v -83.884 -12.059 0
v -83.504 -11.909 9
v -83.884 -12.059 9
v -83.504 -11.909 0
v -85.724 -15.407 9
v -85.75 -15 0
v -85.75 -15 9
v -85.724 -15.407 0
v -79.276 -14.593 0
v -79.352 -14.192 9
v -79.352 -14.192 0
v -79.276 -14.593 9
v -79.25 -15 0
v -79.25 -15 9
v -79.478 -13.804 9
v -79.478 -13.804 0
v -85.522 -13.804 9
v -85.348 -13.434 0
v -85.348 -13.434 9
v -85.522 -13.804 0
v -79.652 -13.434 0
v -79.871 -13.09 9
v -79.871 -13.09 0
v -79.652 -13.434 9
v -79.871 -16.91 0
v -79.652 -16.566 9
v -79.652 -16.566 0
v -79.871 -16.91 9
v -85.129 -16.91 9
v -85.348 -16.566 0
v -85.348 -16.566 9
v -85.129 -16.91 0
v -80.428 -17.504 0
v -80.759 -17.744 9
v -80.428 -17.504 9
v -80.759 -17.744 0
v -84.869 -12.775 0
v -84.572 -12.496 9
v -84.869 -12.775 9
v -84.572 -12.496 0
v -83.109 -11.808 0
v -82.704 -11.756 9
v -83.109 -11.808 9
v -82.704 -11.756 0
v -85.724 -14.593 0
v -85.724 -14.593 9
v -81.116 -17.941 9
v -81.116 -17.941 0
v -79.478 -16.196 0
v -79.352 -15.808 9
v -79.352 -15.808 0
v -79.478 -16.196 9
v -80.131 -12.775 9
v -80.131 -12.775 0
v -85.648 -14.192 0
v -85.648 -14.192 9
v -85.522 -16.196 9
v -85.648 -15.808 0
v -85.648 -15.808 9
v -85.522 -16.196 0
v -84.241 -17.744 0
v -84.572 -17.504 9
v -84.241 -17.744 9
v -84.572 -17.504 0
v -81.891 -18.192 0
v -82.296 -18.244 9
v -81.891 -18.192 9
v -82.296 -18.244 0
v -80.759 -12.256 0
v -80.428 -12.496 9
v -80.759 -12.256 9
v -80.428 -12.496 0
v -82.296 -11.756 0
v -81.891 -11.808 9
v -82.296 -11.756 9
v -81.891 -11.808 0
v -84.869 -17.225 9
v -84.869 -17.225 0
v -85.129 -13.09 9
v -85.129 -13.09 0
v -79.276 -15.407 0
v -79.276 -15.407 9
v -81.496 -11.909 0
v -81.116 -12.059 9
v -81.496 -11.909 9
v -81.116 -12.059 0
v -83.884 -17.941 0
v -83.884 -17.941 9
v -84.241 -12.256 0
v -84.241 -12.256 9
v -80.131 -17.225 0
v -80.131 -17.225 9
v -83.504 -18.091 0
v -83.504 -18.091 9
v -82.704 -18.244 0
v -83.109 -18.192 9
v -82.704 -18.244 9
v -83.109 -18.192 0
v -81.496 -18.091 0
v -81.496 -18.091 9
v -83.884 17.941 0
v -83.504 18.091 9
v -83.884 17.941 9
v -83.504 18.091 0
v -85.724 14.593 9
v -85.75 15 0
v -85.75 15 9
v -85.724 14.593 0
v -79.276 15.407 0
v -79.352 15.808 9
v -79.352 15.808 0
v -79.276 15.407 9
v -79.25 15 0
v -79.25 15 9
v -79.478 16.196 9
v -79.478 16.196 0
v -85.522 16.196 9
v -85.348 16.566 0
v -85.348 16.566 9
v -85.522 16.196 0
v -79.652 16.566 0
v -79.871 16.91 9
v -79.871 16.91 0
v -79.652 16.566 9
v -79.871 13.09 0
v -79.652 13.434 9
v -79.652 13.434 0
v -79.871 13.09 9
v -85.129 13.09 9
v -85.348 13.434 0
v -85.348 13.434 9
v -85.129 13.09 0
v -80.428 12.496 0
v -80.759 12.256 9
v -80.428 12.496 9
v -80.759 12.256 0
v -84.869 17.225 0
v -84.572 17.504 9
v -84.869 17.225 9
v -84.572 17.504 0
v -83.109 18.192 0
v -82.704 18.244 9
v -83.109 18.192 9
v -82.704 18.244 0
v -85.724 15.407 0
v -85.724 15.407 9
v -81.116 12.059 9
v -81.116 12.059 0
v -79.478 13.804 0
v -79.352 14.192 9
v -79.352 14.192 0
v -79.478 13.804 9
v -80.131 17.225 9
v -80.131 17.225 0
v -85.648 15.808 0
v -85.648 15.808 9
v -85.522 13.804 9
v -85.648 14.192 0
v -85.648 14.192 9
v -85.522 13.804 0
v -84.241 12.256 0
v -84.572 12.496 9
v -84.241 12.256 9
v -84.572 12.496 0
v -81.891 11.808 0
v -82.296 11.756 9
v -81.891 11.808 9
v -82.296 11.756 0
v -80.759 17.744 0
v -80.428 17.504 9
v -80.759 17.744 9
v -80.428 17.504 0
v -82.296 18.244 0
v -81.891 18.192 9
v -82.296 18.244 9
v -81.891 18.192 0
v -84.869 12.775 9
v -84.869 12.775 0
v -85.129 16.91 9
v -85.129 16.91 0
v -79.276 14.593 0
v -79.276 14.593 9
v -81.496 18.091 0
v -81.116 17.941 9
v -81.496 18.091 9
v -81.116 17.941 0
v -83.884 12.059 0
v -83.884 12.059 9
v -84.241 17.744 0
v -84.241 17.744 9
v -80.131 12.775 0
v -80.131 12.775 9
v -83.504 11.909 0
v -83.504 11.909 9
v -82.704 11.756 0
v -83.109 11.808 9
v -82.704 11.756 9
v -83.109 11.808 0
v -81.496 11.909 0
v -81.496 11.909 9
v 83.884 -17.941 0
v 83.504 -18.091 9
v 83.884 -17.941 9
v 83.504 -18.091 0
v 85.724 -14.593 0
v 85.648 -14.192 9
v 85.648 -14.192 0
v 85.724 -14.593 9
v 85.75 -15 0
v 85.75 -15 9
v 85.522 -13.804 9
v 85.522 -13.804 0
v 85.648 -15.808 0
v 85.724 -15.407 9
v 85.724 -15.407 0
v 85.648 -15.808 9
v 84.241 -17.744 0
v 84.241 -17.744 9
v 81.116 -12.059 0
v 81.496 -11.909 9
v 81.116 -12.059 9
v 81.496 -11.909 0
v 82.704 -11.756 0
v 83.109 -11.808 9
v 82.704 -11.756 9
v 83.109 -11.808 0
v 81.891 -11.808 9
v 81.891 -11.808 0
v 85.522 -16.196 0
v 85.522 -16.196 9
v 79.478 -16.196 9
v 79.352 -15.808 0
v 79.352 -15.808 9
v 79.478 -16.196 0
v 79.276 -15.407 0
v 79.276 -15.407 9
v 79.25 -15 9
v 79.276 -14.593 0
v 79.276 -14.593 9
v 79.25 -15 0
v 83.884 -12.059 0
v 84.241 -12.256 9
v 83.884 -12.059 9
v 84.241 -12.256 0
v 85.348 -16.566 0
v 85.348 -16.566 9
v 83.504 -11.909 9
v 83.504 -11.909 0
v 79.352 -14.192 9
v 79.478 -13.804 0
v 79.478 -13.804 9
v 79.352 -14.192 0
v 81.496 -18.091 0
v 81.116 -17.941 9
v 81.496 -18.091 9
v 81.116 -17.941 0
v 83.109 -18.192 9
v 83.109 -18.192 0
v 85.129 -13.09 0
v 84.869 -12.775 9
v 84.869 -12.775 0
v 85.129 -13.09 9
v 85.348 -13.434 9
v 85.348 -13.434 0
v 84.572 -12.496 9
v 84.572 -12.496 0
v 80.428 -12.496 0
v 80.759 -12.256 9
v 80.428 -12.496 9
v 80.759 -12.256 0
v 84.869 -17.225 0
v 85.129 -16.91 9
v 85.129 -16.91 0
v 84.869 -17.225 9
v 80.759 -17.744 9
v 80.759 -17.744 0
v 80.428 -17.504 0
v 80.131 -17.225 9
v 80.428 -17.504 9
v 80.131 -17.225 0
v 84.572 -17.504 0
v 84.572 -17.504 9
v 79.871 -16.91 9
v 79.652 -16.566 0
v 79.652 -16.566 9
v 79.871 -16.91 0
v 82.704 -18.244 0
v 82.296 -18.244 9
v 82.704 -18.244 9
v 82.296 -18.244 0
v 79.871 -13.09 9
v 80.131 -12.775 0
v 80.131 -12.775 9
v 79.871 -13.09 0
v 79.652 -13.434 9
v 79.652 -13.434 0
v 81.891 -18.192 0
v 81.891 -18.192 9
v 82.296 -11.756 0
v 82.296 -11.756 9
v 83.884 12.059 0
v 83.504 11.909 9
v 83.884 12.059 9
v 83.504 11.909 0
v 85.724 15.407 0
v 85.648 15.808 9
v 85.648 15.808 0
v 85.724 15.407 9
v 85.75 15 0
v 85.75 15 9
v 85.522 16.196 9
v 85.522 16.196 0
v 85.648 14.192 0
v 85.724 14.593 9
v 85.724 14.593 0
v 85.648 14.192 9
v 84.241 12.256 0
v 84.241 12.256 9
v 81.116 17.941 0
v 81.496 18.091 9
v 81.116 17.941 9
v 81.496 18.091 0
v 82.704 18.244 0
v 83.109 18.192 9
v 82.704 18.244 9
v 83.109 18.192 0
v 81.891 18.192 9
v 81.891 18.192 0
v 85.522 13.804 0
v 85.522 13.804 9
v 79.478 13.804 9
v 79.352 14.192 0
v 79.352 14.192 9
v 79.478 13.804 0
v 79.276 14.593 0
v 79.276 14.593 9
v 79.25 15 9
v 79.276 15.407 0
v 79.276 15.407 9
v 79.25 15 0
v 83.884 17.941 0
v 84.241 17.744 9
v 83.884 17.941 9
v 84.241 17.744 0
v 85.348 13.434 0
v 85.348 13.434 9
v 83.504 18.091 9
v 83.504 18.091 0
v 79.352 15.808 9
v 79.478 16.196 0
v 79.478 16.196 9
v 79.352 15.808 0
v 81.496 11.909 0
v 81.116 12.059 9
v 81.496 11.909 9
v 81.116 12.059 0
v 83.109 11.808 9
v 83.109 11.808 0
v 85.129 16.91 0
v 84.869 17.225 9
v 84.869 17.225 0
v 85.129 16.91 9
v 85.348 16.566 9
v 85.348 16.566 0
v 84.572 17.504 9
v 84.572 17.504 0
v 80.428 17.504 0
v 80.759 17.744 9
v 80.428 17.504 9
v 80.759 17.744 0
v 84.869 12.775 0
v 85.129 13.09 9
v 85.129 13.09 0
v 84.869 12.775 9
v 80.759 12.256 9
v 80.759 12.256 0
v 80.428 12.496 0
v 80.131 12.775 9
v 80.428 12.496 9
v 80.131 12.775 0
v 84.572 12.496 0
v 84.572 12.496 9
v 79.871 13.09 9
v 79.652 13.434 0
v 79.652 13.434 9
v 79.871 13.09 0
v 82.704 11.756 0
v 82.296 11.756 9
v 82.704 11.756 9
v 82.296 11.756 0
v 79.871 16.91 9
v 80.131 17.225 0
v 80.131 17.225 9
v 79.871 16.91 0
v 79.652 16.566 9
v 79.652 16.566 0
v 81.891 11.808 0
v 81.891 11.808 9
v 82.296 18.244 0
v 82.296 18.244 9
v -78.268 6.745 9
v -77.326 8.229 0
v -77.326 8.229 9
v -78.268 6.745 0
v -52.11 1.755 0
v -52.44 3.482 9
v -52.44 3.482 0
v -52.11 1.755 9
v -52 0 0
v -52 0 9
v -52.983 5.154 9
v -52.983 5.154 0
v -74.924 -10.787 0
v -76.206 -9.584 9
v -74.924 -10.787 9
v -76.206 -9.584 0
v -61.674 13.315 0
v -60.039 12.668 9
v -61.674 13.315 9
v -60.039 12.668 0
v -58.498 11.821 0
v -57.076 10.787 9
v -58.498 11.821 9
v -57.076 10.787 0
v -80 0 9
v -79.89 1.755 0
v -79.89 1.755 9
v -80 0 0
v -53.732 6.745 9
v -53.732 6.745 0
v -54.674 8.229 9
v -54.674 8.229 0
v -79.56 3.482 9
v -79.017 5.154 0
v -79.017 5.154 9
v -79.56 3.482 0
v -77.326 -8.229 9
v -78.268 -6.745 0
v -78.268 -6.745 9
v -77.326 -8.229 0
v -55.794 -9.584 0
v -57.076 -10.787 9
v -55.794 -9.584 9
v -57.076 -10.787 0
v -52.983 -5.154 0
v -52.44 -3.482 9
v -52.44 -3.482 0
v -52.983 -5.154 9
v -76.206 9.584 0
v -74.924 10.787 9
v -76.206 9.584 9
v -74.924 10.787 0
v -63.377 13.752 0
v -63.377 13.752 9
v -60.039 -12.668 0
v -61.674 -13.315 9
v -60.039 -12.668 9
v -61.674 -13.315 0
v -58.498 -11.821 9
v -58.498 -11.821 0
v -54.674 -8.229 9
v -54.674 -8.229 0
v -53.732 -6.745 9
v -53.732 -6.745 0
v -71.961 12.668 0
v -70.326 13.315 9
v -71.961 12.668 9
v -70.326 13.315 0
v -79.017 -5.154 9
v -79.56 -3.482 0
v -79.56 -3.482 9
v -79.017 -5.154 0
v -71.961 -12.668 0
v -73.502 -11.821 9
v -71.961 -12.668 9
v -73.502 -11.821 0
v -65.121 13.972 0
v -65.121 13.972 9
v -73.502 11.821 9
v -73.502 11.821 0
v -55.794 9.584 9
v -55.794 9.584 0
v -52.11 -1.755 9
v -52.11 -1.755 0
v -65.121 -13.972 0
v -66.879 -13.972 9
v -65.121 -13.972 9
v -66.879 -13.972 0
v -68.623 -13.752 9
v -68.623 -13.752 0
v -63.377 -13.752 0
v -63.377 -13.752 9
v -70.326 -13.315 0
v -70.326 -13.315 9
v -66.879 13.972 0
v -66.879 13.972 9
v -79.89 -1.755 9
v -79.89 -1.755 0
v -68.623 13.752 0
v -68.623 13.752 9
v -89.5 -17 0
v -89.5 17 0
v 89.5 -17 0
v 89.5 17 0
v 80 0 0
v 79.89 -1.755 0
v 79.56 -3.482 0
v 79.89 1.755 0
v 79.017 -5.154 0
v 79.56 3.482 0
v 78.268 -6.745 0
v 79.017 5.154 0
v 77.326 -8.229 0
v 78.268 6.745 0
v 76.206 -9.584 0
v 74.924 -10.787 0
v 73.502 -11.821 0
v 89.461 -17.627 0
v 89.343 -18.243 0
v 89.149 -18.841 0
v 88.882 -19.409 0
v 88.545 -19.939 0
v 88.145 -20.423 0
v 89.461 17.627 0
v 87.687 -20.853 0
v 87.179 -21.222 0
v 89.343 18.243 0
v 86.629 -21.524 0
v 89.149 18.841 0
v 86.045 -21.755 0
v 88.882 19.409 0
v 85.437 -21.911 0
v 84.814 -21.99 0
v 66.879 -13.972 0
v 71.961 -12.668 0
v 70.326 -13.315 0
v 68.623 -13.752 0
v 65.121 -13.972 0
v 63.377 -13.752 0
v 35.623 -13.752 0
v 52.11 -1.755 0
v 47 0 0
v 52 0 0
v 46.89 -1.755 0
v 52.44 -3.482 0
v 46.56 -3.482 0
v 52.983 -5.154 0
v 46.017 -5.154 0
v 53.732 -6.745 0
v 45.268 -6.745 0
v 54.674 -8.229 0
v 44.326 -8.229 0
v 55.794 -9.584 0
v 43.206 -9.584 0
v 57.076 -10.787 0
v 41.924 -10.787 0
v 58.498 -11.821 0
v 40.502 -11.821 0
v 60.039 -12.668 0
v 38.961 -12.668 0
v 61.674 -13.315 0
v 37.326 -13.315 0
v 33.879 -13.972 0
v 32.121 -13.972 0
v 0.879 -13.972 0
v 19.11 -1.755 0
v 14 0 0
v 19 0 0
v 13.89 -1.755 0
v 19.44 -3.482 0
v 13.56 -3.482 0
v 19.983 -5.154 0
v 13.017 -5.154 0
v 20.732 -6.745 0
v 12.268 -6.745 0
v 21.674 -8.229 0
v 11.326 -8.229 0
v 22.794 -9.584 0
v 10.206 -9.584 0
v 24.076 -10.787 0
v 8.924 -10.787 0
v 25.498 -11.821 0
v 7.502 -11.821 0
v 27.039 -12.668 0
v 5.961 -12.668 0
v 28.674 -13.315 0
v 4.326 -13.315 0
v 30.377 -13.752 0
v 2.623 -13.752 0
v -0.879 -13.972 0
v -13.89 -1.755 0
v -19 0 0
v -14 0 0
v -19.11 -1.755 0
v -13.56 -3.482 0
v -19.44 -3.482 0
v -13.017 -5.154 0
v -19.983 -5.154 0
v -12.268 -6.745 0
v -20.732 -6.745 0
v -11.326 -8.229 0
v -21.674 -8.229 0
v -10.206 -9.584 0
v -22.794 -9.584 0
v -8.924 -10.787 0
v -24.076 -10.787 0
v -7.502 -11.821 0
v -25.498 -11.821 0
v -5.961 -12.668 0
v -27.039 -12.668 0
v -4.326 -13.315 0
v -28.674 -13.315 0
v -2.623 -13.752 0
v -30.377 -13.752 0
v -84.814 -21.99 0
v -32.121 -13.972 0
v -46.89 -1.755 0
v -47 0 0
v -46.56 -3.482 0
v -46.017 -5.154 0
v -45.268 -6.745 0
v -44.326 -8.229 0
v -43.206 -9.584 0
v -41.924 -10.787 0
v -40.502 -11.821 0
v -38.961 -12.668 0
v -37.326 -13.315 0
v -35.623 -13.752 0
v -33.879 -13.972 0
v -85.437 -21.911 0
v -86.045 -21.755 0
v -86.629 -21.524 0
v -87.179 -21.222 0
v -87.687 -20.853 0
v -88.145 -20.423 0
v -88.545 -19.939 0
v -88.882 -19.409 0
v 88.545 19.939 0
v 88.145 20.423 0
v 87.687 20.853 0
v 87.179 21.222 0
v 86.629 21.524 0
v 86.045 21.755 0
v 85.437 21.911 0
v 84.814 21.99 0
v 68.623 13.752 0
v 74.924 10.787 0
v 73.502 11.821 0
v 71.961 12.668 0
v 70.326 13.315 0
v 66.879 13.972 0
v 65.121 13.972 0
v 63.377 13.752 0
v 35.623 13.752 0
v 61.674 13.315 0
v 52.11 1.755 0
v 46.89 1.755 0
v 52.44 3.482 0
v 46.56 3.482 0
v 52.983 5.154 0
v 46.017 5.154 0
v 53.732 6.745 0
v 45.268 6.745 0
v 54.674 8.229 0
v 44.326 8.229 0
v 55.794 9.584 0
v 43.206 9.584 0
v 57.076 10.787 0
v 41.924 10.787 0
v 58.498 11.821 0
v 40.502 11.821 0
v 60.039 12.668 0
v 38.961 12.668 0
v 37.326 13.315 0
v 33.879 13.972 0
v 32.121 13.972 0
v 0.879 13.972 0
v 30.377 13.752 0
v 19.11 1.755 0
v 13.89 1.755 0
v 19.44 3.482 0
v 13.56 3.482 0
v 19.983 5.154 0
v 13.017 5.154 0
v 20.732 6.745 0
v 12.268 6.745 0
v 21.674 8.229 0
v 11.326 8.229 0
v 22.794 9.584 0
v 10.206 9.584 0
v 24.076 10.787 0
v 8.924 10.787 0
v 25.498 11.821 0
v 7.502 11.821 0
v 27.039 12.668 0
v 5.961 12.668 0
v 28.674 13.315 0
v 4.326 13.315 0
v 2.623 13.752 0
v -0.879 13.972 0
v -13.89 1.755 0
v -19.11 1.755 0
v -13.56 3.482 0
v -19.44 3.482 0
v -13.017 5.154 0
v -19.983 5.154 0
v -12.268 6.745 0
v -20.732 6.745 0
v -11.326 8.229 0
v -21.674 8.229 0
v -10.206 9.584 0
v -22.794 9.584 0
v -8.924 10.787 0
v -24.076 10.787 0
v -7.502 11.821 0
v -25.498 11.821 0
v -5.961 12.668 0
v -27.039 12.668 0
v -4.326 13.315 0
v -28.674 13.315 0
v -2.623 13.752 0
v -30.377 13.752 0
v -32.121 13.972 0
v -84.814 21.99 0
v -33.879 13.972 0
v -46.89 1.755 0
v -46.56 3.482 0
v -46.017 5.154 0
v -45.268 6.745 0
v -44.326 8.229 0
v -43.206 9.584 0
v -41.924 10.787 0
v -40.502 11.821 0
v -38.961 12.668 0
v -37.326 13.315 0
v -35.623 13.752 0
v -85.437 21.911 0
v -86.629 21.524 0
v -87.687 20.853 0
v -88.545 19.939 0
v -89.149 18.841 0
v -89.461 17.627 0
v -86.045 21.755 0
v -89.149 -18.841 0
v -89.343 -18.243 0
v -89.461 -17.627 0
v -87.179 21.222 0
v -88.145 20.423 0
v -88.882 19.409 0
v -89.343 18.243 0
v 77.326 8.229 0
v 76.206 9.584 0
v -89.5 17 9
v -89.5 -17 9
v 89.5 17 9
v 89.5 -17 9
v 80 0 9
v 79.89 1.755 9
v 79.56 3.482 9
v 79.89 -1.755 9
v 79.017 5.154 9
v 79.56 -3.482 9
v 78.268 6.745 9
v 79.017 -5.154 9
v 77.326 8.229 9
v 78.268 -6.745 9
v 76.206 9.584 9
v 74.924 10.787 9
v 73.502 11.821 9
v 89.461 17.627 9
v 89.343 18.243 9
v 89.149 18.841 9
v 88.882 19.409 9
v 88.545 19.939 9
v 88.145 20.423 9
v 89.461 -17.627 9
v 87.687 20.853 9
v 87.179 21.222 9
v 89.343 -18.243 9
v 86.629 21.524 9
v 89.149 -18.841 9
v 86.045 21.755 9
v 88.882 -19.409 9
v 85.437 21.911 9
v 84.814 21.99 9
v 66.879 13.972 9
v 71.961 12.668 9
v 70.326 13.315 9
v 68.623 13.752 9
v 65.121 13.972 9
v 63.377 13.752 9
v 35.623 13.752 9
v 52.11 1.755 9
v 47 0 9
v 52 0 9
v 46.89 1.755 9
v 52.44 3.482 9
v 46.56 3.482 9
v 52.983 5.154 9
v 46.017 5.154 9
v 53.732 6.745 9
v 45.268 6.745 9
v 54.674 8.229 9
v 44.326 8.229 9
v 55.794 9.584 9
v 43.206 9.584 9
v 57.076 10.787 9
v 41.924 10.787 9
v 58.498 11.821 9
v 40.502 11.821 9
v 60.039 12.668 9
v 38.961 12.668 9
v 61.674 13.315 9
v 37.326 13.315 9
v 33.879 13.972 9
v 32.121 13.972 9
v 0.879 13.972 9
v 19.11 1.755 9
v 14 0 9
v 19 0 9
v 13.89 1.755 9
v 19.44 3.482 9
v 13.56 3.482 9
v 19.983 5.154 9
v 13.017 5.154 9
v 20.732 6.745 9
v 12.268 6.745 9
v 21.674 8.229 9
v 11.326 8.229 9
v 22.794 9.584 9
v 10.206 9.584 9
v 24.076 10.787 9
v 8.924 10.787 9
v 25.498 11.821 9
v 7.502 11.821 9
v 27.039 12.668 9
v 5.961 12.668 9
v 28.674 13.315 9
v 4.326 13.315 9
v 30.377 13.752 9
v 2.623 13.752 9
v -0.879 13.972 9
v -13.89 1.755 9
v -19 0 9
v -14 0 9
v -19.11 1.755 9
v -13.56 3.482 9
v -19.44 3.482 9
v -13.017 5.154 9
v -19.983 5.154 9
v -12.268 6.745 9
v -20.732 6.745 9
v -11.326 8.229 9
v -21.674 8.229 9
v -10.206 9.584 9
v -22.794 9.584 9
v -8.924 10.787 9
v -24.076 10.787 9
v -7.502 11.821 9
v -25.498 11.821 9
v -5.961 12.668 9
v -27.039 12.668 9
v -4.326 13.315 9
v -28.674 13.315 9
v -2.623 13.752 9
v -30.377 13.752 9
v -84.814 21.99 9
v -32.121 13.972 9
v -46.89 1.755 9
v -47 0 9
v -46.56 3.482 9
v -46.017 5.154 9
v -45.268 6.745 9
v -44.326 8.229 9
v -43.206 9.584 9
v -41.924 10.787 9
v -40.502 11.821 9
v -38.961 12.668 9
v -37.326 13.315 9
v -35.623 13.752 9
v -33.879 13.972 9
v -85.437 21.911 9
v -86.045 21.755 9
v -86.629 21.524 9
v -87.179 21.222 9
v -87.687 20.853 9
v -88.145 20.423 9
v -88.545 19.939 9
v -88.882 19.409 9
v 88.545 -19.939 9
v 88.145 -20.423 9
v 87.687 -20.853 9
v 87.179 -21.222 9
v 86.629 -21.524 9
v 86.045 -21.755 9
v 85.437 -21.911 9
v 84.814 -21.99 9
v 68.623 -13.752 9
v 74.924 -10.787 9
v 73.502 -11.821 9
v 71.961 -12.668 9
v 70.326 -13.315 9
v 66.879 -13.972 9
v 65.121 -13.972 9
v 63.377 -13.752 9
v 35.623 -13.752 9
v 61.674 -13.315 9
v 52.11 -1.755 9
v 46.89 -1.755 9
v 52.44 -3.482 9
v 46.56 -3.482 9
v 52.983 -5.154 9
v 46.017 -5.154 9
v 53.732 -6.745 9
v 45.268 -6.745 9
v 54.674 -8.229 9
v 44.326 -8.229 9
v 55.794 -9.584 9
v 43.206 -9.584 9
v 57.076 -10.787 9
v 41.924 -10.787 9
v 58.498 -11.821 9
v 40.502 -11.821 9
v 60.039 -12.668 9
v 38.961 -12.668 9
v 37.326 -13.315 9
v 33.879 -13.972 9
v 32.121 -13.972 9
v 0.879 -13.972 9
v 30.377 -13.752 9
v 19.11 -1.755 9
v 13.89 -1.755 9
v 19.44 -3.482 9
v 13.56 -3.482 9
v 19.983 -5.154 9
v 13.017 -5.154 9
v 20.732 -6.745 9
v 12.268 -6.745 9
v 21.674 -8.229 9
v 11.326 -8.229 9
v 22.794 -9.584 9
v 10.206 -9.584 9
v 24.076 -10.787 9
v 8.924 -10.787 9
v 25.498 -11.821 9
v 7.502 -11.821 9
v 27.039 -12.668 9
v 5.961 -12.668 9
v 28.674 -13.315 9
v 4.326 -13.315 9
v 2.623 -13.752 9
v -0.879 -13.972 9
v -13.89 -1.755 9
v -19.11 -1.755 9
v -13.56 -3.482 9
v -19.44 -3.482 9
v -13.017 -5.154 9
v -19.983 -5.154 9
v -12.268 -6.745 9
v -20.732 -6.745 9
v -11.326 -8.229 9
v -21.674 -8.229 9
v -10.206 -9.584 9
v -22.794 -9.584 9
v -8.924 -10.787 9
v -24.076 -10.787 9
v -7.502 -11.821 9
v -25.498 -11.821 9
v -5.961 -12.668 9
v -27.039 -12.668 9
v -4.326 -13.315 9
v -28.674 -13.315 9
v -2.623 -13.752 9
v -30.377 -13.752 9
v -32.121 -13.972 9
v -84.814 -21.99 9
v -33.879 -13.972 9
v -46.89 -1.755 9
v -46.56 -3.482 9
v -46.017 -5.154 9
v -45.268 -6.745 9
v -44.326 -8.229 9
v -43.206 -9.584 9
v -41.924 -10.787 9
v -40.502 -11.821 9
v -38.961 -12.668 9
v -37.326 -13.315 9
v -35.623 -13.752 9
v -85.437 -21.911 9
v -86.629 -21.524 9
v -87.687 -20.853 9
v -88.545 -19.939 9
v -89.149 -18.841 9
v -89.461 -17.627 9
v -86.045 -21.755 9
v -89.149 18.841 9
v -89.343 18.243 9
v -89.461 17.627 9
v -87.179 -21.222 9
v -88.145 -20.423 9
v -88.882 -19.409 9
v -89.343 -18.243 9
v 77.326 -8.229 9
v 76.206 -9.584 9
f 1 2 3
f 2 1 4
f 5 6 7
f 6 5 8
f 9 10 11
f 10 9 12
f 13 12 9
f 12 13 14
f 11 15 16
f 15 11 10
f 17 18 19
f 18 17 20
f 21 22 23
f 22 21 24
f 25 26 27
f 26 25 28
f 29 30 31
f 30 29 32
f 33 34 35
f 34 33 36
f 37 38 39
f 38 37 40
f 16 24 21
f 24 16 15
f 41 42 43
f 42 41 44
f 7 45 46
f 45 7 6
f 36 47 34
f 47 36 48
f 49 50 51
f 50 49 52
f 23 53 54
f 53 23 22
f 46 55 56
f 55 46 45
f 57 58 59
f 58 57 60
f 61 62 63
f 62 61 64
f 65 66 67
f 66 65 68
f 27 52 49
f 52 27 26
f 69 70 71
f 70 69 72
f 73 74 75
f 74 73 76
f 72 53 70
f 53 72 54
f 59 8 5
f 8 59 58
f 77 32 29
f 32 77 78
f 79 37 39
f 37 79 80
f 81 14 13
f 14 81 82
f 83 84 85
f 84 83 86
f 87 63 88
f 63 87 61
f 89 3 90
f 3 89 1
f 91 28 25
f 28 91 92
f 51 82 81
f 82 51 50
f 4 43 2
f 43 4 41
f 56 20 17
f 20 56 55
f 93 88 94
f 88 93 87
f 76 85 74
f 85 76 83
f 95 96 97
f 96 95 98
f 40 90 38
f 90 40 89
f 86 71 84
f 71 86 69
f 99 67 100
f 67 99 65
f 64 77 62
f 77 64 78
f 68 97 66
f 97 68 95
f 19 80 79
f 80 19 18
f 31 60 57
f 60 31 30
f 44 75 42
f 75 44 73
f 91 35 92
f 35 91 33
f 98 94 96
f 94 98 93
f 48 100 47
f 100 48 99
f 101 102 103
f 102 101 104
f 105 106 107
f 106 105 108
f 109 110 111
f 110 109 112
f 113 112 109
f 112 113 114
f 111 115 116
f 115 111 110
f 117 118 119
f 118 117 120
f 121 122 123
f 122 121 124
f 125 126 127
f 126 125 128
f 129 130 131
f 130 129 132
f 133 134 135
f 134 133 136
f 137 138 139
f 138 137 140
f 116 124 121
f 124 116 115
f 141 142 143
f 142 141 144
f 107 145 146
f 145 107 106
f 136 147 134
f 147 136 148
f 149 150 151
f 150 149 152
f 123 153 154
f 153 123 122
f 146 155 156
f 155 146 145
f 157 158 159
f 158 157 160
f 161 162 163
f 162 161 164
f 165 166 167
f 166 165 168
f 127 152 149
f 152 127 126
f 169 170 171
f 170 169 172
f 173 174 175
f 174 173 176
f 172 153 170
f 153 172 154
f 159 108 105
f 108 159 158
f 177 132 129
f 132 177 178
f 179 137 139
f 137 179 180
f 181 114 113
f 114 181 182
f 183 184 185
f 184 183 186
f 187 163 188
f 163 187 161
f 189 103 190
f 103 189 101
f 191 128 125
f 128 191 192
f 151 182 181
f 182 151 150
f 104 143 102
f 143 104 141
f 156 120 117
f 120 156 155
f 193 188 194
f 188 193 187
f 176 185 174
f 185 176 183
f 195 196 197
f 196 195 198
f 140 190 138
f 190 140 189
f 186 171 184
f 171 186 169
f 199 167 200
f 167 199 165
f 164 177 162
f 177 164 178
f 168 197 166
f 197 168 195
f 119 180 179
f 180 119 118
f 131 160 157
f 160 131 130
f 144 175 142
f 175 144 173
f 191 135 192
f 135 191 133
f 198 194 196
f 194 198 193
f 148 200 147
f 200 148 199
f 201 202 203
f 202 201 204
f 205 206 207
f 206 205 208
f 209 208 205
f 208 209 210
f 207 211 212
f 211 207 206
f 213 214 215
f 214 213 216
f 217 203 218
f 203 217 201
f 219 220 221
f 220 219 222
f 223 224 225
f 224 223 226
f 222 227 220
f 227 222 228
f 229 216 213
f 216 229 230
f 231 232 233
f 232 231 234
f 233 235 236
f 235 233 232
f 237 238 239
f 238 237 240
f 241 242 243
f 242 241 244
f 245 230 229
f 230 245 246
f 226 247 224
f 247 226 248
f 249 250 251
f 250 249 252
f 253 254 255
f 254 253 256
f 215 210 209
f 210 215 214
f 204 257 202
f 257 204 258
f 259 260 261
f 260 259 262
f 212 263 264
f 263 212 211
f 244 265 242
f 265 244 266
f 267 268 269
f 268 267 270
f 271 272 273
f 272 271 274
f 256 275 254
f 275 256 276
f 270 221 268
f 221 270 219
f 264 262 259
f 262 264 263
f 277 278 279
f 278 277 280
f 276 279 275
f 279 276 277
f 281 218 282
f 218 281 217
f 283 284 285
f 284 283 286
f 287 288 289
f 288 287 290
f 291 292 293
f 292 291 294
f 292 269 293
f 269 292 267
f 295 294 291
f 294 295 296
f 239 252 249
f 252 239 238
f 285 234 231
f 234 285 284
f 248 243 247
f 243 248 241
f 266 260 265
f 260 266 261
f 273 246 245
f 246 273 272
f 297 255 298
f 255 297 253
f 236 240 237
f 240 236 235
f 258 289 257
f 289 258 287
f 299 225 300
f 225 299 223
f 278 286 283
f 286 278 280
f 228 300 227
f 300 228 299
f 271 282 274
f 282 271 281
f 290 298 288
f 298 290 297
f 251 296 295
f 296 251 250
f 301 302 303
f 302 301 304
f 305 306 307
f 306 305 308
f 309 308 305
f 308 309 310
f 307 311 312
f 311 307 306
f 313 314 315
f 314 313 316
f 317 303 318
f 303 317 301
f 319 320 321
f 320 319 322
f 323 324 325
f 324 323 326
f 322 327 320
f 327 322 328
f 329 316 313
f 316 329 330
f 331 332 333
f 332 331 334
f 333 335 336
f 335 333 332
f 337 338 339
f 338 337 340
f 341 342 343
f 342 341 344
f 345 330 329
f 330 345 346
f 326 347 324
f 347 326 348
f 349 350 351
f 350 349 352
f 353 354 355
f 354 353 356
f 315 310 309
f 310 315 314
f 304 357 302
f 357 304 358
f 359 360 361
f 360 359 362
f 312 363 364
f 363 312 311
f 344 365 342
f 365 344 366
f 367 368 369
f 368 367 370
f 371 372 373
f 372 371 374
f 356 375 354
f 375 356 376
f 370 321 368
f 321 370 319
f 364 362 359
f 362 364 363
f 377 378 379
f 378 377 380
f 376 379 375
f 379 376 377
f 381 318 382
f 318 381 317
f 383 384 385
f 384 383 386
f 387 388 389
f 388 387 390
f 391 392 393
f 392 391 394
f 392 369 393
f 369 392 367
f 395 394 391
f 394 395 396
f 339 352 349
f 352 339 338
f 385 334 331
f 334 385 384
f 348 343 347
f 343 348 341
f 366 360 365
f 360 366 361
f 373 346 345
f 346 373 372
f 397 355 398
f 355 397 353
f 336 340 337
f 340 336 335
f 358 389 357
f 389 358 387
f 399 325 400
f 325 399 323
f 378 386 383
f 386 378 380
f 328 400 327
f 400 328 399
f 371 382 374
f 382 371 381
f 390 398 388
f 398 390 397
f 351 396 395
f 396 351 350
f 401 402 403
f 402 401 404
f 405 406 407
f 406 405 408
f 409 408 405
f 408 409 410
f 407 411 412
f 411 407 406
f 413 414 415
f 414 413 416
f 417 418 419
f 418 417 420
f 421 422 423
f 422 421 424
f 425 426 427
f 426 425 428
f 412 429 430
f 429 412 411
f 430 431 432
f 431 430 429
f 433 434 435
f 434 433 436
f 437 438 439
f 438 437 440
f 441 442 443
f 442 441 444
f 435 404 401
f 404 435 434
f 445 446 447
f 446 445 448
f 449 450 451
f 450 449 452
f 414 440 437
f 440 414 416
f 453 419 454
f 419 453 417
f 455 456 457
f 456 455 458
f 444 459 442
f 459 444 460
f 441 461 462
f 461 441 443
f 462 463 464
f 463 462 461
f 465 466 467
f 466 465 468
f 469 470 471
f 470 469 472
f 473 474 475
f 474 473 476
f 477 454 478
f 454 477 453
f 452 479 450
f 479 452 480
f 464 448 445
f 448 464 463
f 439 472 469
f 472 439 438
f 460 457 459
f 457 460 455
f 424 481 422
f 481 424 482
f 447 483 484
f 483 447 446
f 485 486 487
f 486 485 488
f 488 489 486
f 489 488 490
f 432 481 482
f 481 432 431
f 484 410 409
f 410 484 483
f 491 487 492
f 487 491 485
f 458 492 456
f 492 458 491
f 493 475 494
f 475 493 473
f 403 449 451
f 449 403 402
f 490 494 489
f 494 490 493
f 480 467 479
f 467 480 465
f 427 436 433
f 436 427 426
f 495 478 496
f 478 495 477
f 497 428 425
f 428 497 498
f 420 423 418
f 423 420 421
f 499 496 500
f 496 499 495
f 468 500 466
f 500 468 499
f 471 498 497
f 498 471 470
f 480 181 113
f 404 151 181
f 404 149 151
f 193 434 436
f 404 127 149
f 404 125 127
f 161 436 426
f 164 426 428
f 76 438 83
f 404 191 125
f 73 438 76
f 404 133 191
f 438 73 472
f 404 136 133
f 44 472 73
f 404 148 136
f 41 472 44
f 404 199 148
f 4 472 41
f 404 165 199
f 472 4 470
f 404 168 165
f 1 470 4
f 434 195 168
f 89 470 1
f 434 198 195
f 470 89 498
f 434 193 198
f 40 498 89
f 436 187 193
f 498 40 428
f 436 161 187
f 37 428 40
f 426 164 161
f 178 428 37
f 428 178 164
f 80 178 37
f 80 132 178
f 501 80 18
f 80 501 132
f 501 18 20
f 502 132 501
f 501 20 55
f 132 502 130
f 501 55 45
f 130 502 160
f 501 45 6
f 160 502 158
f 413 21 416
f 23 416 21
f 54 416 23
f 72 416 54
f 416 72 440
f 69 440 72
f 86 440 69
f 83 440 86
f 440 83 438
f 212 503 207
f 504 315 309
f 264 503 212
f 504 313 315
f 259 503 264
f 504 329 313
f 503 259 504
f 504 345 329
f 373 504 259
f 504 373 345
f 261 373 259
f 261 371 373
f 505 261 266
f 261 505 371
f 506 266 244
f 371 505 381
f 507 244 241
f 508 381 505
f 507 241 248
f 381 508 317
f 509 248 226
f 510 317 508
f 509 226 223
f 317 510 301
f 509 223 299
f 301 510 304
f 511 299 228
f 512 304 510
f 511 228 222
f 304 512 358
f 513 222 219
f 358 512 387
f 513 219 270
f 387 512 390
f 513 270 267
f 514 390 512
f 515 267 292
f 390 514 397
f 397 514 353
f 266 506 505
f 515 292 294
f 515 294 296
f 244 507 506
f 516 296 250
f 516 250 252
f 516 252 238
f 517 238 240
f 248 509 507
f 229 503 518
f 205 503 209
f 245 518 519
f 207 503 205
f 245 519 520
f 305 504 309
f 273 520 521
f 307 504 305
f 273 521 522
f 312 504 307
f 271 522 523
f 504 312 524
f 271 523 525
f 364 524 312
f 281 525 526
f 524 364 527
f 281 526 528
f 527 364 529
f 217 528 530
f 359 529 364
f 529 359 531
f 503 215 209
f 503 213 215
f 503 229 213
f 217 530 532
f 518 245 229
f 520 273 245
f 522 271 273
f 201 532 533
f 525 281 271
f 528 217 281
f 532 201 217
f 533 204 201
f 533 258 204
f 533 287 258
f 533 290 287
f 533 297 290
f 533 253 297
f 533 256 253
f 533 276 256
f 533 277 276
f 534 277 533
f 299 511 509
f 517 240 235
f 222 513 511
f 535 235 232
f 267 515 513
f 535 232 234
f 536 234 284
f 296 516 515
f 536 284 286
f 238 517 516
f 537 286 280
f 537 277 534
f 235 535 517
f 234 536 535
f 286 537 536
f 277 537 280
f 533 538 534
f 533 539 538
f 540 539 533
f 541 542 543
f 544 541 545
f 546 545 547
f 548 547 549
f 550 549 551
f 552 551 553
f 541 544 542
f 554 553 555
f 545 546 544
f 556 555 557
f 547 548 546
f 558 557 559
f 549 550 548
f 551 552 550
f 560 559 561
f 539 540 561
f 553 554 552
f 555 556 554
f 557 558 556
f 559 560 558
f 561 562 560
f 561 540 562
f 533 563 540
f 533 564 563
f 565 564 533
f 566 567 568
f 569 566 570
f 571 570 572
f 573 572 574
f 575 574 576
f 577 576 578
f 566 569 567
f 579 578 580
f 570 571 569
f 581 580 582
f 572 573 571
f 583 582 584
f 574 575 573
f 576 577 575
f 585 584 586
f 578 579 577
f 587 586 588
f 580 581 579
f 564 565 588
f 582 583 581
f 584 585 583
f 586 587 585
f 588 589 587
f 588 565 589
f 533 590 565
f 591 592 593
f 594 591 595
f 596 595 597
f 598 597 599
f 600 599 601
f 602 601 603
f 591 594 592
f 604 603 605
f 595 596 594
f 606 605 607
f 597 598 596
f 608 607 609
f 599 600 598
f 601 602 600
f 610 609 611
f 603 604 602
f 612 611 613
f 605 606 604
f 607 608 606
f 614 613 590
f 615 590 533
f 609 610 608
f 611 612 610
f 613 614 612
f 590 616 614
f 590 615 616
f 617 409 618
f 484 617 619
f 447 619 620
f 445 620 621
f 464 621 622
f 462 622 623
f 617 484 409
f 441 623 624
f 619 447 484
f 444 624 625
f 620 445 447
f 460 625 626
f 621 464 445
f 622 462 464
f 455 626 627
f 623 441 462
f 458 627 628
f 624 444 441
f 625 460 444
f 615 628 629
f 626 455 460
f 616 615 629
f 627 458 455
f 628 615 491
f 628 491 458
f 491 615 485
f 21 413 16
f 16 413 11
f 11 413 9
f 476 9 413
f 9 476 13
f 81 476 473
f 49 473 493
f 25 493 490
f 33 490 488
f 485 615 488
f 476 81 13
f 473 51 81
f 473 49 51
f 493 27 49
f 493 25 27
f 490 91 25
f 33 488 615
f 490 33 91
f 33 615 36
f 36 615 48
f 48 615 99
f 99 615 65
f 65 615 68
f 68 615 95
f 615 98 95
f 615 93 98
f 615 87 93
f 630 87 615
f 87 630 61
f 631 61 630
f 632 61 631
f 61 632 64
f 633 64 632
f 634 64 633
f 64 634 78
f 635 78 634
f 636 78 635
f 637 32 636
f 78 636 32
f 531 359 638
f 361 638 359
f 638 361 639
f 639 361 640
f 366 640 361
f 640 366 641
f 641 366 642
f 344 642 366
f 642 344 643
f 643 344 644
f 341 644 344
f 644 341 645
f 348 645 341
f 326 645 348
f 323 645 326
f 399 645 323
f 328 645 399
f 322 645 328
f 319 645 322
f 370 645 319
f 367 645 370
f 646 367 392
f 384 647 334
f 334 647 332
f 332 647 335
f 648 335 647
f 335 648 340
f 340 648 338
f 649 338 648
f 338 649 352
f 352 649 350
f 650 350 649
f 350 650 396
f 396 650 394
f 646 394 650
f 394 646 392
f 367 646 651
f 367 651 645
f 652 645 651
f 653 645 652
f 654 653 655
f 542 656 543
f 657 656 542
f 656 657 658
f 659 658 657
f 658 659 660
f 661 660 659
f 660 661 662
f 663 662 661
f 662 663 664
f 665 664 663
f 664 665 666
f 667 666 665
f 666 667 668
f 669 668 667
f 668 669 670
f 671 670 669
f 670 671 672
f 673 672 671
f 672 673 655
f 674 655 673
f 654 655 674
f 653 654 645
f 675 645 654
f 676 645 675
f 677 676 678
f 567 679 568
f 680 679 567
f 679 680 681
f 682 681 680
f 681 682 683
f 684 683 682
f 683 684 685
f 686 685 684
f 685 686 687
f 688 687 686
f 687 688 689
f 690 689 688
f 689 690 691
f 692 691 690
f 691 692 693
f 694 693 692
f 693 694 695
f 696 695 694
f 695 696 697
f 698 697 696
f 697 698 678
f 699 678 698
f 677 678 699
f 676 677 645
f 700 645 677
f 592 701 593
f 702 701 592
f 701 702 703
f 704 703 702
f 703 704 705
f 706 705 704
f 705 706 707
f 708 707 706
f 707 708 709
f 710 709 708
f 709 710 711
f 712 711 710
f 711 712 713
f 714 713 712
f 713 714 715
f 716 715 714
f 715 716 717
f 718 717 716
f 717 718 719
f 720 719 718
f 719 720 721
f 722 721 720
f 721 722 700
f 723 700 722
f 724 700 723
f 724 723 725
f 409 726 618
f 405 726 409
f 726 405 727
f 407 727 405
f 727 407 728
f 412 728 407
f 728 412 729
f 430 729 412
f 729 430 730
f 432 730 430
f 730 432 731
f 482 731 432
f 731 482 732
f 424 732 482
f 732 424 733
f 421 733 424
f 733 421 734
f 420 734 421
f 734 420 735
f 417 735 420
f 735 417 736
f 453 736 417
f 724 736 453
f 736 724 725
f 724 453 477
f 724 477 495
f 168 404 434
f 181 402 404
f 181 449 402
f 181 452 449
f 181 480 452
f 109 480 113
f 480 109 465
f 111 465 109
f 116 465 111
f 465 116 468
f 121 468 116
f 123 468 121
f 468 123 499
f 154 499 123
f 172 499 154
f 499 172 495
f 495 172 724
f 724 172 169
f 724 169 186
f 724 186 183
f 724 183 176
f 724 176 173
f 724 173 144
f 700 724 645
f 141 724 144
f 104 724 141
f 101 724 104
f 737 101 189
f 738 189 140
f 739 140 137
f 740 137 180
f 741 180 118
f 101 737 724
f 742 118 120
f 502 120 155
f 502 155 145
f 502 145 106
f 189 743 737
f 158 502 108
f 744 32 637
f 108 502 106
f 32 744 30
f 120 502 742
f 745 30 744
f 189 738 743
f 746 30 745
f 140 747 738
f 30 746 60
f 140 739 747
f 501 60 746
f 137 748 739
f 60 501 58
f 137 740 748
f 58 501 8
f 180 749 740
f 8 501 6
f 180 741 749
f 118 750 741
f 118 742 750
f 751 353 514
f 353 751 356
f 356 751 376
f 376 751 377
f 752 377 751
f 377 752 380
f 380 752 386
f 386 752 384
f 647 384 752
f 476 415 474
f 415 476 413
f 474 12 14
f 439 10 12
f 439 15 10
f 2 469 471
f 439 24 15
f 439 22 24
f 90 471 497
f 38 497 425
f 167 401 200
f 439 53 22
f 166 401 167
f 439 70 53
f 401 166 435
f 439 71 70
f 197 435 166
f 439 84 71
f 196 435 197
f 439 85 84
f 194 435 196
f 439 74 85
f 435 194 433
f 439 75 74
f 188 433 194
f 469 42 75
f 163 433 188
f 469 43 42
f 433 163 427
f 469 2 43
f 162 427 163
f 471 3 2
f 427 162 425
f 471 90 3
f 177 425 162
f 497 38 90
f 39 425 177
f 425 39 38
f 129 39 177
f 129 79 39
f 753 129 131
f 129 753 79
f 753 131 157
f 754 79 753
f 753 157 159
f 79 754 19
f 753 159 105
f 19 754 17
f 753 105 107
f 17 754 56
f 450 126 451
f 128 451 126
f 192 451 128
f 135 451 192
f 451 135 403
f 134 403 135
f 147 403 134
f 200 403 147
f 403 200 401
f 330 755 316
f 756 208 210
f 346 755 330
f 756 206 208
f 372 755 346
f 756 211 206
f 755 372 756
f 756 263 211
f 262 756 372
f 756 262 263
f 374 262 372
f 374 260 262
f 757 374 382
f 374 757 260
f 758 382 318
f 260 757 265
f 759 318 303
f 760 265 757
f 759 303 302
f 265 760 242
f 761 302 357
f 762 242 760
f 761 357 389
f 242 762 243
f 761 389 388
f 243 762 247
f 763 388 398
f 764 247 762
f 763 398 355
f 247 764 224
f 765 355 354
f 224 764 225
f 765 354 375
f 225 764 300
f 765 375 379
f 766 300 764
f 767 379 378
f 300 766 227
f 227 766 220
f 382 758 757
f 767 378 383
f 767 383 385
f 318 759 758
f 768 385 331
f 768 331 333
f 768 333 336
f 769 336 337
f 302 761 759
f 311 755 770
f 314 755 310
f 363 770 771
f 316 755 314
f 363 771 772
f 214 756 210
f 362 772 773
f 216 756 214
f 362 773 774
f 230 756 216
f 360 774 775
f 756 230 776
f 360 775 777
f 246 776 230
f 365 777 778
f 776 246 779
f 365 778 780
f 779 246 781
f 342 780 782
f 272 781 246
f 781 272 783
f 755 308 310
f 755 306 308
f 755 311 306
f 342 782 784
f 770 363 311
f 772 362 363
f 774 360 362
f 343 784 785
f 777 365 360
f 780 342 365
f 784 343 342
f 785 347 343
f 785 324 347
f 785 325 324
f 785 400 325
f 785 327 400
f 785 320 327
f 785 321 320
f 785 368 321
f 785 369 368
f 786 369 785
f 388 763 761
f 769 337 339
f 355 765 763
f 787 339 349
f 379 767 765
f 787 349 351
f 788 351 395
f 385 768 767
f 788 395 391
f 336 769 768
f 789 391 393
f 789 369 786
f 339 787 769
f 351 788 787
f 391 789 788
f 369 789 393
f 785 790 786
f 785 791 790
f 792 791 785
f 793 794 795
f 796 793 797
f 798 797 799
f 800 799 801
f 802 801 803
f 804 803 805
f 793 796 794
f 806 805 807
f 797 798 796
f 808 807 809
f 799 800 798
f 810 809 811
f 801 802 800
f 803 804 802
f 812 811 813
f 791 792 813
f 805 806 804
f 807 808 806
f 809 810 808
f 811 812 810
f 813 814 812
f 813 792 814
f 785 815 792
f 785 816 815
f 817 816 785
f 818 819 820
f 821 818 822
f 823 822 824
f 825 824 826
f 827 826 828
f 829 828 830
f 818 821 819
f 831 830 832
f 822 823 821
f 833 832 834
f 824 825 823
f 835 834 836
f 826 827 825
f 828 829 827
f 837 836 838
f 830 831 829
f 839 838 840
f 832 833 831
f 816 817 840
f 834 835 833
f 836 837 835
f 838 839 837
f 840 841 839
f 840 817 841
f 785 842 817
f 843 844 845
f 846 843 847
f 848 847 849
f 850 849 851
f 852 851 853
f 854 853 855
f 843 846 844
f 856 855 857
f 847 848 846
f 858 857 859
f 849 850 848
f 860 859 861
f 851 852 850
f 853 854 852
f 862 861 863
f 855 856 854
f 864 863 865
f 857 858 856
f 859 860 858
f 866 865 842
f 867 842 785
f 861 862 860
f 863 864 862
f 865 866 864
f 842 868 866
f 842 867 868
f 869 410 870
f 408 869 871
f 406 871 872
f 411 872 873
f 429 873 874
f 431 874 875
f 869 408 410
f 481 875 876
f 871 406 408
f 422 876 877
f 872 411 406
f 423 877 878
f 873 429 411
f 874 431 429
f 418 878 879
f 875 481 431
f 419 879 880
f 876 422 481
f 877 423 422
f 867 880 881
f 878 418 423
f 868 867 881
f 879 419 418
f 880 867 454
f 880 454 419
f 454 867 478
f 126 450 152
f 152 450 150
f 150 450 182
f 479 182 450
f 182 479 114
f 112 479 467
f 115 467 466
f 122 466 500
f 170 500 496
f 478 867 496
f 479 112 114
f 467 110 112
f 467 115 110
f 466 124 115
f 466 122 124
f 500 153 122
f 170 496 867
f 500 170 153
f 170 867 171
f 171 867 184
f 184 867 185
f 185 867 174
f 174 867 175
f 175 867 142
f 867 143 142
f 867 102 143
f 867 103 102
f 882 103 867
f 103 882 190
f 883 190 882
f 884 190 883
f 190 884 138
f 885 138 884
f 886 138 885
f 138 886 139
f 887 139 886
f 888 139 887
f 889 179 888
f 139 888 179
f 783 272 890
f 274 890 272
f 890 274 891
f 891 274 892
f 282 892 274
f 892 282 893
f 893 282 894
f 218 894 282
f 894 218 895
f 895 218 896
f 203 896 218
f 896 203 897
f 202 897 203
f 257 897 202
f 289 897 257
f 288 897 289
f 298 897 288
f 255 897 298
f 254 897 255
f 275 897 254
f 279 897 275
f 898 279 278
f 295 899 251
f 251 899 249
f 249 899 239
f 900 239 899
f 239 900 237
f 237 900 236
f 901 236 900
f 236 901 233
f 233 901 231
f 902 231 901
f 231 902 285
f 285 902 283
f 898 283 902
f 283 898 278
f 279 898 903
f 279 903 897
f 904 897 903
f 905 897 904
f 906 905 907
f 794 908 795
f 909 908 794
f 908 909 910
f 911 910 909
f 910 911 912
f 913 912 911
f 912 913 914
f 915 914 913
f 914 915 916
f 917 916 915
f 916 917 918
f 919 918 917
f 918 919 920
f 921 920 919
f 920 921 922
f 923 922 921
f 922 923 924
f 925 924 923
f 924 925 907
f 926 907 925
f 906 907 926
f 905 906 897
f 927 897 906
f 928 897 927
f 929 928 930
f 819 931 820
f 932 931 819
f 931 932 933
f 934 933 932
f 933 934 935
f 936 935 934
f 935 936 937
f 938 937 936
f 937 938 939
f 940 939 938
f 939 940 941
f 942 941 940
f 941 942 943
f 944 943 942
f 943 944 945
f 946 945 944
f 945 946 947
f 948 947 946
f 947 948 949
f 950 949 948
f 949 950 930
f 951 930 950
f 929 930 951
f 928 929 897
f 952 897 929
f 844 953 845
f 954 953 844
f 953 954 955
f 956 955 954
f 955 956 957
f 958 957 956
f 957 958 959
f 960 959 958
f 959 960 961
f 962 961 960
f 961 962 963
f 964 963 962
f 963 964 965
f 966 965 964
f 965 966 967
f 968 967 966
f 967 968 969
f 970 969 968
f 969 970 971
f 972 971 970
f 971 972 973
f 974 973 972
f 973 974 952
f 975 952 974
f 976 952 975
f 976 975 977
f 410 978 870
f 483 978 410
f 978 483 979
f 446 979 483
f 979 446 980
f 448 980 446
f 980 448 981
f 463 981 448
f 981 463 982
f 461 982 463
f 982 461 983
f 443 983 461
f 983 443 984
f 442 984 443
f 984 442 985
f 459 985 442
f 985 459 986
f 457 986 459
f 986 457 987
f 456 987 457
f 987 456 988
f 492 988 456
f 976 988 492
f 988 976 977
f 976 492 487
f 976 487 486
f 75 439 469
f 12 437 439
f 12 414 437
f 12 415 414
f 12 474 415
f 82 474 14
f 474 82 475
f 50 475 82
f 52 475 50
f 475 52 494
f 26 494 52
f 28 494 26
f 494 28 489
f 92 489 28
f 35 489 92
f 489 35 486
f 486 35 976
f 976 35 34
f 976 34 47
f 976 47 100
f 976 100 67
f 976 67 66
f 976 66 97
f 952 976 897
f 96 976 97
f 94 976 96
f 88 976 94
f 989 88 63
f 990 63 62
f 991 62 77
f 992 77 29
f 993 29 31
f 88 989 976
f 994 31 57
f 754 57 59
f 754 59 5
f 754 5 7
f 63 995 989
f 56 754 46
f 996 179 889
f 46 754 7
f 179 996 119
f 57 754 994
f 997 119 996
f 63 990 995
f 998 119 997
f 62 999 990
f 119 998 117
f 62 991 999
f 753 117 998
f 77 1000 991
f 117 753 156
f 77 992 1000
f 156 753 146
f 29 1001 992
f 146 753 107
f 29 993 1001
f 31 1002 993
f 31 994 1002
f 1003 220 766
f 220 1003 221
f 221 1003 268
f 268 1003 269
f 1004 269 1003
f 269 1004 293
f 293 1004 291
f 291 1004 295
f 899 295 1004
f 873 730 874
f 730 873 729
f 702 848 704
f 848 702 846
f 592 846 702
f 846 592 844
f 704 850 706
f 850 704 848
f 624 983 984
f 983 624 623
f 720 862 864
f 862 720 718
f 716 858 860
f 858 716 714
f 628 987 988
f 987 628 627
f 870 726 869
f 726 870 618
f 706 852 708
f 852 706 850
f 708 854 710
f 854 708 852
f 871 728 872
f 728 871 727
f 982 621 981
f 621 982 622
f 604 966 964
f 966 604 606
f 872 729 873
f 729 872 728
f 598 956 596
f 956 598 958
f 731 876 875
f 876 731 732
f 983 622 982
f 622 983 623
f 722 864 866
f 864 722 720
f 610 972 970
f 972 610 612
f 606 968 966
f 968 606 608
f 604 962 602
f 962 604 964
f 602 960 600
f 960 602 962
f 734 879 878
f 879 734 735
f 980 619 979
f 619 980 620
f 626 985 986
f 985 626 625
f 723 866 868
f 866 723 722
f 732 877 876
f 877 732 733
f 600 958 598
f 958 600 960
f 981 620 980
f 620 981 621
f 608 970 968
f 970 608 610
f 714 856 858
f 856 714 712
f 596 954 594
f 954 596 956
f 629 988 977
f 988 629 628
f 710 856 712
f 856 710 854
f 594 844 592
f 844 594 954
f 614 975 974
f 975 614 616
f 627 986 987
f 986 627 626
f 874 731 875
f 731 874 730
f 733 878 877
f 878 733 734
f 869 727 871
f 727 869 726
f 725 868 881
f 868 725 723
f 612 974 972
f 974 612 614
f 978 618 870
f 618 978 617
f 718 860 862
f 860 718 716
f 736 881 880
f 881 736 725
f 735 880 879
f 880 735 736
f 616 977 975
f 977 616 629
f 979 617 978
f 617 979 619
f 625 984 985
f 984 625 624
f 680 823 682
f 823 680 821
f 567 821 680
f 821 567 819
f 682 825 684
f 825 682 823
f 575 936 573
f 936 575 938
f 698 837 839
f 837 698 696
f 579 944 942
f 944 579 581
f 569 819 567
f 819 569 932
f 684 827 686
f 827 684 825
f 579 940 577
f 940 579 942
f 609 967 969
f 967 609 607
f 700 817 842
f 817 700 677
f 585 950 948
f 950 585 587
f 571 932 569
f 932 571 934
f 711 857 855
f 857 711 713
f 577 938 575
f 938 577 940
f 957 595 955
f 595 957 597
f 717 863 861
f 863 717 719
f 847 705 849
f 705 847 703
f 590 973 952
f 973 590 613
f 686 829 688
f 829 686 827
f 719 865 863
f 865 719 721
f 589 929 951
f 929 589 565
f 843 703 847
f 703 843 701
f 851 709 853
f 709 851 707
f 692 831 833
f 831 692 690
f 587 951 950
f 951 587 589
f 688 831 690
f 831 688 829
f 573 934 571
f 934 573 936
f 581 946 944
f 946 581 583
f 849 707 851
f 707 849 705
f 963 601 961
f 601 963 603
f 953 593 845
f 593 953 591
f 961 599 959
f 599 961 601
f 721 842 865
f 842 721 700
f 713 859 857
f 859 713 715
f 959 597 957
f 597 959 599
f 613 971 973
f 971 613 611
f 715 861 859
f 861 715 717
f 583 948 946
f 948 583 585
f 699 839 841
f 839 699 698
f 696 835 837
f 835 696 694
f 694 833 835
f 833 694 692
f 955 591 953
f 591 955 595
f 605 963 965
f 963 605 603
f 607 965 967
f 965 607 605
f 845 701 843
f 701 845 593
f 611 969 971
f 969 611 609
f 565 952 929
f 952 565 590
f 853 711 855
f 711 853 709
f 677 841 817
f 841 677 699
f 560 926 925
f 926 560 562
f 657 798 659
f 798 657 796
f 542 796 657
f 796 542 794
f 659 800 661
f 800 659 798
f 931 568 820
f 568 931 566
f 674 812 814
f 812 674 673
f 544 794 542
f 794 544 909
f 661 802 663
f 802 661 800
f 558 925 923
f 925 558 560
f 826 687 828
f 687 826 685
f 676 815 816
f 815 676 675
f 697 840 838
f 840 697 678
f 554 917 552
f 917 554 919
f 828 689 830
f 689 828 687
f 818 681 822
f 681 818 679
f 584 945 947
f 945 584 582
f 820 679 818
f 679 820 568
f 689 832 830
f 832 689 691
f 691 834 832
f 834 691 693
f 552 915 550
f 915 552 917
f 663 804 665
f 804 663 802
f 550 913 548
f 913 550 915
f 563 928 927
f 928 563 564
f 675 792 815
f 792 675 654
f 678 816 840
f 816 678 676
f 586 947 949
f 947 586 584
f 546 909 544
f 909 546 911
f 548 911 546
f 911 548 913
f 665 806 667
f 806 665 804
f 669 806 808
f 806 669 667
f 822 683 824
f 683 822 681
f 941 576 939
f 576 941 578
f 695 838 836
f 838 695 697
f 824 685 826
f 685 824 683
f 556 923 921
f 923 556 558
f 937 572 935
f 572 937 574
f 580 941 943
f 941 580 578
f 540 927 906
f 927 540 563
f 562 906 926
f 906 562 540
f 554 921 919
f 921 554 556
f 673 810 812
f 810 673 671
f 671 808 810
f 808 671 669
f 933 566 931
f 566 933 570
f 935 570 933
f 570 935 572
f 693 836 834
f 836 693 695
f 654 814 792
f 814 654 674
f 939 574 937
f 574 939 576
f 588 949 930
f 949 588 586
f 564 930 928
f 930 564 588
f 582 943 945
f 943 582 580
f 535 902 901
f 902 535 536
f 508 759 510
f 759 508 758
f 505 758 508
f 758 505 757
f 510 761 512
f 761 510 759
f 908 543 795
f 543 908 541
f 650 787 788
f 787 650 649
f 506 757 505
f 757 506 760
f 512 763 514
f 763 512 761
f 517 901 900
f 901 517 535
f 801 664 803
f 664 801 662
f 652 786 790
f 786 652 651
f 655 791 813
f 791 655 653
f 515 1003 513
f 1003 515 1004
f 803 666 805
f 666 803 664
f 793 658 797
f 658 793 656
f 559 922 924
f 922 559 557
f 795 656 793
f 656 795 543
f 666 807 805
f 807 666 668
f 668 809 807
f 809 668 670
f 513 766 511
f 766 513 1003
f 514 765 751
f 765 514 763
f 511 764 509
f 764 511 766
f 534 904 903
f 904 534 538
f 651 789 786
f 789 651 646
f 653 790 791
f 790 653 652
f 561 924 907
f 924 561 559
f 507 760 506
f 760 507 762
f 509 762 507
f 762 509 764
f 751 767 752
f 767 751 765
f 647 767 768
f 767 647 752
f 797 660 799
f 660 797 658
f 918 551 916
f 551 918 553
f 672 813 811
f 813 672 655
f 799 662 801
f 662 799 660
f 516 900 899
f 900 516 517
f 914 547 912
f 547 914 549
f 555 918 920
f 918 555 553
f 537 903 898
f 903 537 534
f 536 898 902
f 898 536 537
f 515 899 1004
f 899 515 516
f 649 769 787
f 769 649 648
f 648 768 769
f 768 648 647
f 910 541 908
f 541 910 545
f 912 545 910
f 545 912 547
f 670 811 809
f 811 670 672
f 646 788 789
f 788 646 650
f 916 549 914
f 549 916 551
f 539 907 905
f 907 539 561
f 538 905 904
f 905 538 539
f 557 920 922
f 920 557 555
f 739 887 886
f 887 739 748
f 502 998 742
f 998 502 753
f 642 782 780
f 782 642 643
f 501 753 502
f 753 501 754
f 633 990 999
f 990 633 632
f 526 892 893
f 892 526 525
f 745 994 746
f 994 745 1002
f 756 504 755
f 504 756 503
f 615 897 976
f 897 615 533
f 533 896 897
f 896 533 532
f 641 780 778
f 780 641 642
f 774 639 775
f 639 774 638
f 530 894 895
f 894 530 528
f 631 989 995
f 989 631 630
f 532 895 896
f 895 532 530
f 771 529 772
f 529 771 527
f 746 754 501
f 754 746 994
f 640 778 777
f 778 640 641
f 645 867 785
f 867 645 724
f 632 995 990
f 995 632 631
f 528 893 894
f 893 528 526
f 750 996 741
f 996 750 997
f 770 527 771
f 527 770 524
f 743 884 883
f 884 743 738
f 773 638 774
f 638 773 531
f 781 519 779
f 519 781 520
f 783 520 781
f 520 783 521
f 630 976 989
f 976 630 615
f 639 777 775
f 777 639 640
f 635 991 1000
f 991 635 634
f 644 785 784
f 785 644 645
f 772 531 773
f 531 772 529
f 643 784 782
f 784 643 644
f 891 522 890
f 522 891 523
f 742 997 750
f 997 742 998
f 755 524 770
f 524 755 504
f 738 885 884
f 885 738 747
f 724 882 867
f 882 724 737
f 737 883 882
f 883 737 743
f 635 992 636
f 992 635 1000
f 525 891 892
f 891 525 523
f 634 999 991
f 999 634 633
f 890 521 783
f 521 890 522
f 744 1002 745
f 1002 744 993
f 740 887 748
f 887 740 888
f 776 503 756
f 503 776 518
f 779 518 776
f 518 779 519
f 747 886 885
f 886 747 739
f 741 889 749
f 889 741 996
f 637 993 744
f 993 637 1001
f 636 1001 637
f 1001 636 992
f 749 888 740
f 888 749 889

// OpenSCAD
$fn = 50;

difference() {
	union() {
		hull() {
			translate(v = [-84.5, 17.0, 0]) {
				cylinder(h = 9, r = 5);
			}
			translate(v = [84.5, 17.0, 0]) {
				cylinder(h = 9, r = 5);
			}
			translate(v = [-84.5, -17.0, 0]) {
				cylinder(h = 9, r = 5);
			}
			translate(v = [84.5, -17.0, 0]) {
				cylinder(h = 9, r = 5);
			}
		}
	}
	union() {
		translate(v = [-82.5, -15.0, -100.0]) {
			cylinder(h = 200, r = 3.25);
		}
		translate(v = [-82.5, 15.0, -100.0]) {
			cylinder(h = 200, r = 3.25);
		}
		translate(v = [82.5, -15.0, -100.0]) {
			cylinder(h = 200, r = 3.25);
		}
		translate(v = [82.5, 15.0, -100.0]) {
			cylinder(h = 200, r = 3.25);
		}
		translate(v = [-82.5, -15.0, -100.0]) {
			cylinder(h = 200, r = 1.8);
		}
		translate(v = [-82.5, 15.0, -100.0]) {
			cylinder(h = 200, r = 1.8);
		}
		translate(v = [82.5, -15.0, -100.0]) {
			cylinder(h = 200, r = 1.8);
		}
		translate(v = [82.5, 15.0, -100.0]) {
			cylinder(h = 200, r = 1.8);
		}
		translate(v = [-66.0, 0, 0.0]) {
			cylinder(h = 9, r = 14.0);
		}
		translate(v = [-33.0, 0, 0.0]) {
			cylinder(h = 9, r = 14.0);
		}
		cylinder(h = 9, r = 14.0);
		translate(v = [33.0, 0, 0.0]) {
			cylinder(h = 9, r = 14.0);
		}
		translate(v = [66.0, 0, 0.0]) {
			cylinder(h = 9, r = 14.0);
		}
	}
}
